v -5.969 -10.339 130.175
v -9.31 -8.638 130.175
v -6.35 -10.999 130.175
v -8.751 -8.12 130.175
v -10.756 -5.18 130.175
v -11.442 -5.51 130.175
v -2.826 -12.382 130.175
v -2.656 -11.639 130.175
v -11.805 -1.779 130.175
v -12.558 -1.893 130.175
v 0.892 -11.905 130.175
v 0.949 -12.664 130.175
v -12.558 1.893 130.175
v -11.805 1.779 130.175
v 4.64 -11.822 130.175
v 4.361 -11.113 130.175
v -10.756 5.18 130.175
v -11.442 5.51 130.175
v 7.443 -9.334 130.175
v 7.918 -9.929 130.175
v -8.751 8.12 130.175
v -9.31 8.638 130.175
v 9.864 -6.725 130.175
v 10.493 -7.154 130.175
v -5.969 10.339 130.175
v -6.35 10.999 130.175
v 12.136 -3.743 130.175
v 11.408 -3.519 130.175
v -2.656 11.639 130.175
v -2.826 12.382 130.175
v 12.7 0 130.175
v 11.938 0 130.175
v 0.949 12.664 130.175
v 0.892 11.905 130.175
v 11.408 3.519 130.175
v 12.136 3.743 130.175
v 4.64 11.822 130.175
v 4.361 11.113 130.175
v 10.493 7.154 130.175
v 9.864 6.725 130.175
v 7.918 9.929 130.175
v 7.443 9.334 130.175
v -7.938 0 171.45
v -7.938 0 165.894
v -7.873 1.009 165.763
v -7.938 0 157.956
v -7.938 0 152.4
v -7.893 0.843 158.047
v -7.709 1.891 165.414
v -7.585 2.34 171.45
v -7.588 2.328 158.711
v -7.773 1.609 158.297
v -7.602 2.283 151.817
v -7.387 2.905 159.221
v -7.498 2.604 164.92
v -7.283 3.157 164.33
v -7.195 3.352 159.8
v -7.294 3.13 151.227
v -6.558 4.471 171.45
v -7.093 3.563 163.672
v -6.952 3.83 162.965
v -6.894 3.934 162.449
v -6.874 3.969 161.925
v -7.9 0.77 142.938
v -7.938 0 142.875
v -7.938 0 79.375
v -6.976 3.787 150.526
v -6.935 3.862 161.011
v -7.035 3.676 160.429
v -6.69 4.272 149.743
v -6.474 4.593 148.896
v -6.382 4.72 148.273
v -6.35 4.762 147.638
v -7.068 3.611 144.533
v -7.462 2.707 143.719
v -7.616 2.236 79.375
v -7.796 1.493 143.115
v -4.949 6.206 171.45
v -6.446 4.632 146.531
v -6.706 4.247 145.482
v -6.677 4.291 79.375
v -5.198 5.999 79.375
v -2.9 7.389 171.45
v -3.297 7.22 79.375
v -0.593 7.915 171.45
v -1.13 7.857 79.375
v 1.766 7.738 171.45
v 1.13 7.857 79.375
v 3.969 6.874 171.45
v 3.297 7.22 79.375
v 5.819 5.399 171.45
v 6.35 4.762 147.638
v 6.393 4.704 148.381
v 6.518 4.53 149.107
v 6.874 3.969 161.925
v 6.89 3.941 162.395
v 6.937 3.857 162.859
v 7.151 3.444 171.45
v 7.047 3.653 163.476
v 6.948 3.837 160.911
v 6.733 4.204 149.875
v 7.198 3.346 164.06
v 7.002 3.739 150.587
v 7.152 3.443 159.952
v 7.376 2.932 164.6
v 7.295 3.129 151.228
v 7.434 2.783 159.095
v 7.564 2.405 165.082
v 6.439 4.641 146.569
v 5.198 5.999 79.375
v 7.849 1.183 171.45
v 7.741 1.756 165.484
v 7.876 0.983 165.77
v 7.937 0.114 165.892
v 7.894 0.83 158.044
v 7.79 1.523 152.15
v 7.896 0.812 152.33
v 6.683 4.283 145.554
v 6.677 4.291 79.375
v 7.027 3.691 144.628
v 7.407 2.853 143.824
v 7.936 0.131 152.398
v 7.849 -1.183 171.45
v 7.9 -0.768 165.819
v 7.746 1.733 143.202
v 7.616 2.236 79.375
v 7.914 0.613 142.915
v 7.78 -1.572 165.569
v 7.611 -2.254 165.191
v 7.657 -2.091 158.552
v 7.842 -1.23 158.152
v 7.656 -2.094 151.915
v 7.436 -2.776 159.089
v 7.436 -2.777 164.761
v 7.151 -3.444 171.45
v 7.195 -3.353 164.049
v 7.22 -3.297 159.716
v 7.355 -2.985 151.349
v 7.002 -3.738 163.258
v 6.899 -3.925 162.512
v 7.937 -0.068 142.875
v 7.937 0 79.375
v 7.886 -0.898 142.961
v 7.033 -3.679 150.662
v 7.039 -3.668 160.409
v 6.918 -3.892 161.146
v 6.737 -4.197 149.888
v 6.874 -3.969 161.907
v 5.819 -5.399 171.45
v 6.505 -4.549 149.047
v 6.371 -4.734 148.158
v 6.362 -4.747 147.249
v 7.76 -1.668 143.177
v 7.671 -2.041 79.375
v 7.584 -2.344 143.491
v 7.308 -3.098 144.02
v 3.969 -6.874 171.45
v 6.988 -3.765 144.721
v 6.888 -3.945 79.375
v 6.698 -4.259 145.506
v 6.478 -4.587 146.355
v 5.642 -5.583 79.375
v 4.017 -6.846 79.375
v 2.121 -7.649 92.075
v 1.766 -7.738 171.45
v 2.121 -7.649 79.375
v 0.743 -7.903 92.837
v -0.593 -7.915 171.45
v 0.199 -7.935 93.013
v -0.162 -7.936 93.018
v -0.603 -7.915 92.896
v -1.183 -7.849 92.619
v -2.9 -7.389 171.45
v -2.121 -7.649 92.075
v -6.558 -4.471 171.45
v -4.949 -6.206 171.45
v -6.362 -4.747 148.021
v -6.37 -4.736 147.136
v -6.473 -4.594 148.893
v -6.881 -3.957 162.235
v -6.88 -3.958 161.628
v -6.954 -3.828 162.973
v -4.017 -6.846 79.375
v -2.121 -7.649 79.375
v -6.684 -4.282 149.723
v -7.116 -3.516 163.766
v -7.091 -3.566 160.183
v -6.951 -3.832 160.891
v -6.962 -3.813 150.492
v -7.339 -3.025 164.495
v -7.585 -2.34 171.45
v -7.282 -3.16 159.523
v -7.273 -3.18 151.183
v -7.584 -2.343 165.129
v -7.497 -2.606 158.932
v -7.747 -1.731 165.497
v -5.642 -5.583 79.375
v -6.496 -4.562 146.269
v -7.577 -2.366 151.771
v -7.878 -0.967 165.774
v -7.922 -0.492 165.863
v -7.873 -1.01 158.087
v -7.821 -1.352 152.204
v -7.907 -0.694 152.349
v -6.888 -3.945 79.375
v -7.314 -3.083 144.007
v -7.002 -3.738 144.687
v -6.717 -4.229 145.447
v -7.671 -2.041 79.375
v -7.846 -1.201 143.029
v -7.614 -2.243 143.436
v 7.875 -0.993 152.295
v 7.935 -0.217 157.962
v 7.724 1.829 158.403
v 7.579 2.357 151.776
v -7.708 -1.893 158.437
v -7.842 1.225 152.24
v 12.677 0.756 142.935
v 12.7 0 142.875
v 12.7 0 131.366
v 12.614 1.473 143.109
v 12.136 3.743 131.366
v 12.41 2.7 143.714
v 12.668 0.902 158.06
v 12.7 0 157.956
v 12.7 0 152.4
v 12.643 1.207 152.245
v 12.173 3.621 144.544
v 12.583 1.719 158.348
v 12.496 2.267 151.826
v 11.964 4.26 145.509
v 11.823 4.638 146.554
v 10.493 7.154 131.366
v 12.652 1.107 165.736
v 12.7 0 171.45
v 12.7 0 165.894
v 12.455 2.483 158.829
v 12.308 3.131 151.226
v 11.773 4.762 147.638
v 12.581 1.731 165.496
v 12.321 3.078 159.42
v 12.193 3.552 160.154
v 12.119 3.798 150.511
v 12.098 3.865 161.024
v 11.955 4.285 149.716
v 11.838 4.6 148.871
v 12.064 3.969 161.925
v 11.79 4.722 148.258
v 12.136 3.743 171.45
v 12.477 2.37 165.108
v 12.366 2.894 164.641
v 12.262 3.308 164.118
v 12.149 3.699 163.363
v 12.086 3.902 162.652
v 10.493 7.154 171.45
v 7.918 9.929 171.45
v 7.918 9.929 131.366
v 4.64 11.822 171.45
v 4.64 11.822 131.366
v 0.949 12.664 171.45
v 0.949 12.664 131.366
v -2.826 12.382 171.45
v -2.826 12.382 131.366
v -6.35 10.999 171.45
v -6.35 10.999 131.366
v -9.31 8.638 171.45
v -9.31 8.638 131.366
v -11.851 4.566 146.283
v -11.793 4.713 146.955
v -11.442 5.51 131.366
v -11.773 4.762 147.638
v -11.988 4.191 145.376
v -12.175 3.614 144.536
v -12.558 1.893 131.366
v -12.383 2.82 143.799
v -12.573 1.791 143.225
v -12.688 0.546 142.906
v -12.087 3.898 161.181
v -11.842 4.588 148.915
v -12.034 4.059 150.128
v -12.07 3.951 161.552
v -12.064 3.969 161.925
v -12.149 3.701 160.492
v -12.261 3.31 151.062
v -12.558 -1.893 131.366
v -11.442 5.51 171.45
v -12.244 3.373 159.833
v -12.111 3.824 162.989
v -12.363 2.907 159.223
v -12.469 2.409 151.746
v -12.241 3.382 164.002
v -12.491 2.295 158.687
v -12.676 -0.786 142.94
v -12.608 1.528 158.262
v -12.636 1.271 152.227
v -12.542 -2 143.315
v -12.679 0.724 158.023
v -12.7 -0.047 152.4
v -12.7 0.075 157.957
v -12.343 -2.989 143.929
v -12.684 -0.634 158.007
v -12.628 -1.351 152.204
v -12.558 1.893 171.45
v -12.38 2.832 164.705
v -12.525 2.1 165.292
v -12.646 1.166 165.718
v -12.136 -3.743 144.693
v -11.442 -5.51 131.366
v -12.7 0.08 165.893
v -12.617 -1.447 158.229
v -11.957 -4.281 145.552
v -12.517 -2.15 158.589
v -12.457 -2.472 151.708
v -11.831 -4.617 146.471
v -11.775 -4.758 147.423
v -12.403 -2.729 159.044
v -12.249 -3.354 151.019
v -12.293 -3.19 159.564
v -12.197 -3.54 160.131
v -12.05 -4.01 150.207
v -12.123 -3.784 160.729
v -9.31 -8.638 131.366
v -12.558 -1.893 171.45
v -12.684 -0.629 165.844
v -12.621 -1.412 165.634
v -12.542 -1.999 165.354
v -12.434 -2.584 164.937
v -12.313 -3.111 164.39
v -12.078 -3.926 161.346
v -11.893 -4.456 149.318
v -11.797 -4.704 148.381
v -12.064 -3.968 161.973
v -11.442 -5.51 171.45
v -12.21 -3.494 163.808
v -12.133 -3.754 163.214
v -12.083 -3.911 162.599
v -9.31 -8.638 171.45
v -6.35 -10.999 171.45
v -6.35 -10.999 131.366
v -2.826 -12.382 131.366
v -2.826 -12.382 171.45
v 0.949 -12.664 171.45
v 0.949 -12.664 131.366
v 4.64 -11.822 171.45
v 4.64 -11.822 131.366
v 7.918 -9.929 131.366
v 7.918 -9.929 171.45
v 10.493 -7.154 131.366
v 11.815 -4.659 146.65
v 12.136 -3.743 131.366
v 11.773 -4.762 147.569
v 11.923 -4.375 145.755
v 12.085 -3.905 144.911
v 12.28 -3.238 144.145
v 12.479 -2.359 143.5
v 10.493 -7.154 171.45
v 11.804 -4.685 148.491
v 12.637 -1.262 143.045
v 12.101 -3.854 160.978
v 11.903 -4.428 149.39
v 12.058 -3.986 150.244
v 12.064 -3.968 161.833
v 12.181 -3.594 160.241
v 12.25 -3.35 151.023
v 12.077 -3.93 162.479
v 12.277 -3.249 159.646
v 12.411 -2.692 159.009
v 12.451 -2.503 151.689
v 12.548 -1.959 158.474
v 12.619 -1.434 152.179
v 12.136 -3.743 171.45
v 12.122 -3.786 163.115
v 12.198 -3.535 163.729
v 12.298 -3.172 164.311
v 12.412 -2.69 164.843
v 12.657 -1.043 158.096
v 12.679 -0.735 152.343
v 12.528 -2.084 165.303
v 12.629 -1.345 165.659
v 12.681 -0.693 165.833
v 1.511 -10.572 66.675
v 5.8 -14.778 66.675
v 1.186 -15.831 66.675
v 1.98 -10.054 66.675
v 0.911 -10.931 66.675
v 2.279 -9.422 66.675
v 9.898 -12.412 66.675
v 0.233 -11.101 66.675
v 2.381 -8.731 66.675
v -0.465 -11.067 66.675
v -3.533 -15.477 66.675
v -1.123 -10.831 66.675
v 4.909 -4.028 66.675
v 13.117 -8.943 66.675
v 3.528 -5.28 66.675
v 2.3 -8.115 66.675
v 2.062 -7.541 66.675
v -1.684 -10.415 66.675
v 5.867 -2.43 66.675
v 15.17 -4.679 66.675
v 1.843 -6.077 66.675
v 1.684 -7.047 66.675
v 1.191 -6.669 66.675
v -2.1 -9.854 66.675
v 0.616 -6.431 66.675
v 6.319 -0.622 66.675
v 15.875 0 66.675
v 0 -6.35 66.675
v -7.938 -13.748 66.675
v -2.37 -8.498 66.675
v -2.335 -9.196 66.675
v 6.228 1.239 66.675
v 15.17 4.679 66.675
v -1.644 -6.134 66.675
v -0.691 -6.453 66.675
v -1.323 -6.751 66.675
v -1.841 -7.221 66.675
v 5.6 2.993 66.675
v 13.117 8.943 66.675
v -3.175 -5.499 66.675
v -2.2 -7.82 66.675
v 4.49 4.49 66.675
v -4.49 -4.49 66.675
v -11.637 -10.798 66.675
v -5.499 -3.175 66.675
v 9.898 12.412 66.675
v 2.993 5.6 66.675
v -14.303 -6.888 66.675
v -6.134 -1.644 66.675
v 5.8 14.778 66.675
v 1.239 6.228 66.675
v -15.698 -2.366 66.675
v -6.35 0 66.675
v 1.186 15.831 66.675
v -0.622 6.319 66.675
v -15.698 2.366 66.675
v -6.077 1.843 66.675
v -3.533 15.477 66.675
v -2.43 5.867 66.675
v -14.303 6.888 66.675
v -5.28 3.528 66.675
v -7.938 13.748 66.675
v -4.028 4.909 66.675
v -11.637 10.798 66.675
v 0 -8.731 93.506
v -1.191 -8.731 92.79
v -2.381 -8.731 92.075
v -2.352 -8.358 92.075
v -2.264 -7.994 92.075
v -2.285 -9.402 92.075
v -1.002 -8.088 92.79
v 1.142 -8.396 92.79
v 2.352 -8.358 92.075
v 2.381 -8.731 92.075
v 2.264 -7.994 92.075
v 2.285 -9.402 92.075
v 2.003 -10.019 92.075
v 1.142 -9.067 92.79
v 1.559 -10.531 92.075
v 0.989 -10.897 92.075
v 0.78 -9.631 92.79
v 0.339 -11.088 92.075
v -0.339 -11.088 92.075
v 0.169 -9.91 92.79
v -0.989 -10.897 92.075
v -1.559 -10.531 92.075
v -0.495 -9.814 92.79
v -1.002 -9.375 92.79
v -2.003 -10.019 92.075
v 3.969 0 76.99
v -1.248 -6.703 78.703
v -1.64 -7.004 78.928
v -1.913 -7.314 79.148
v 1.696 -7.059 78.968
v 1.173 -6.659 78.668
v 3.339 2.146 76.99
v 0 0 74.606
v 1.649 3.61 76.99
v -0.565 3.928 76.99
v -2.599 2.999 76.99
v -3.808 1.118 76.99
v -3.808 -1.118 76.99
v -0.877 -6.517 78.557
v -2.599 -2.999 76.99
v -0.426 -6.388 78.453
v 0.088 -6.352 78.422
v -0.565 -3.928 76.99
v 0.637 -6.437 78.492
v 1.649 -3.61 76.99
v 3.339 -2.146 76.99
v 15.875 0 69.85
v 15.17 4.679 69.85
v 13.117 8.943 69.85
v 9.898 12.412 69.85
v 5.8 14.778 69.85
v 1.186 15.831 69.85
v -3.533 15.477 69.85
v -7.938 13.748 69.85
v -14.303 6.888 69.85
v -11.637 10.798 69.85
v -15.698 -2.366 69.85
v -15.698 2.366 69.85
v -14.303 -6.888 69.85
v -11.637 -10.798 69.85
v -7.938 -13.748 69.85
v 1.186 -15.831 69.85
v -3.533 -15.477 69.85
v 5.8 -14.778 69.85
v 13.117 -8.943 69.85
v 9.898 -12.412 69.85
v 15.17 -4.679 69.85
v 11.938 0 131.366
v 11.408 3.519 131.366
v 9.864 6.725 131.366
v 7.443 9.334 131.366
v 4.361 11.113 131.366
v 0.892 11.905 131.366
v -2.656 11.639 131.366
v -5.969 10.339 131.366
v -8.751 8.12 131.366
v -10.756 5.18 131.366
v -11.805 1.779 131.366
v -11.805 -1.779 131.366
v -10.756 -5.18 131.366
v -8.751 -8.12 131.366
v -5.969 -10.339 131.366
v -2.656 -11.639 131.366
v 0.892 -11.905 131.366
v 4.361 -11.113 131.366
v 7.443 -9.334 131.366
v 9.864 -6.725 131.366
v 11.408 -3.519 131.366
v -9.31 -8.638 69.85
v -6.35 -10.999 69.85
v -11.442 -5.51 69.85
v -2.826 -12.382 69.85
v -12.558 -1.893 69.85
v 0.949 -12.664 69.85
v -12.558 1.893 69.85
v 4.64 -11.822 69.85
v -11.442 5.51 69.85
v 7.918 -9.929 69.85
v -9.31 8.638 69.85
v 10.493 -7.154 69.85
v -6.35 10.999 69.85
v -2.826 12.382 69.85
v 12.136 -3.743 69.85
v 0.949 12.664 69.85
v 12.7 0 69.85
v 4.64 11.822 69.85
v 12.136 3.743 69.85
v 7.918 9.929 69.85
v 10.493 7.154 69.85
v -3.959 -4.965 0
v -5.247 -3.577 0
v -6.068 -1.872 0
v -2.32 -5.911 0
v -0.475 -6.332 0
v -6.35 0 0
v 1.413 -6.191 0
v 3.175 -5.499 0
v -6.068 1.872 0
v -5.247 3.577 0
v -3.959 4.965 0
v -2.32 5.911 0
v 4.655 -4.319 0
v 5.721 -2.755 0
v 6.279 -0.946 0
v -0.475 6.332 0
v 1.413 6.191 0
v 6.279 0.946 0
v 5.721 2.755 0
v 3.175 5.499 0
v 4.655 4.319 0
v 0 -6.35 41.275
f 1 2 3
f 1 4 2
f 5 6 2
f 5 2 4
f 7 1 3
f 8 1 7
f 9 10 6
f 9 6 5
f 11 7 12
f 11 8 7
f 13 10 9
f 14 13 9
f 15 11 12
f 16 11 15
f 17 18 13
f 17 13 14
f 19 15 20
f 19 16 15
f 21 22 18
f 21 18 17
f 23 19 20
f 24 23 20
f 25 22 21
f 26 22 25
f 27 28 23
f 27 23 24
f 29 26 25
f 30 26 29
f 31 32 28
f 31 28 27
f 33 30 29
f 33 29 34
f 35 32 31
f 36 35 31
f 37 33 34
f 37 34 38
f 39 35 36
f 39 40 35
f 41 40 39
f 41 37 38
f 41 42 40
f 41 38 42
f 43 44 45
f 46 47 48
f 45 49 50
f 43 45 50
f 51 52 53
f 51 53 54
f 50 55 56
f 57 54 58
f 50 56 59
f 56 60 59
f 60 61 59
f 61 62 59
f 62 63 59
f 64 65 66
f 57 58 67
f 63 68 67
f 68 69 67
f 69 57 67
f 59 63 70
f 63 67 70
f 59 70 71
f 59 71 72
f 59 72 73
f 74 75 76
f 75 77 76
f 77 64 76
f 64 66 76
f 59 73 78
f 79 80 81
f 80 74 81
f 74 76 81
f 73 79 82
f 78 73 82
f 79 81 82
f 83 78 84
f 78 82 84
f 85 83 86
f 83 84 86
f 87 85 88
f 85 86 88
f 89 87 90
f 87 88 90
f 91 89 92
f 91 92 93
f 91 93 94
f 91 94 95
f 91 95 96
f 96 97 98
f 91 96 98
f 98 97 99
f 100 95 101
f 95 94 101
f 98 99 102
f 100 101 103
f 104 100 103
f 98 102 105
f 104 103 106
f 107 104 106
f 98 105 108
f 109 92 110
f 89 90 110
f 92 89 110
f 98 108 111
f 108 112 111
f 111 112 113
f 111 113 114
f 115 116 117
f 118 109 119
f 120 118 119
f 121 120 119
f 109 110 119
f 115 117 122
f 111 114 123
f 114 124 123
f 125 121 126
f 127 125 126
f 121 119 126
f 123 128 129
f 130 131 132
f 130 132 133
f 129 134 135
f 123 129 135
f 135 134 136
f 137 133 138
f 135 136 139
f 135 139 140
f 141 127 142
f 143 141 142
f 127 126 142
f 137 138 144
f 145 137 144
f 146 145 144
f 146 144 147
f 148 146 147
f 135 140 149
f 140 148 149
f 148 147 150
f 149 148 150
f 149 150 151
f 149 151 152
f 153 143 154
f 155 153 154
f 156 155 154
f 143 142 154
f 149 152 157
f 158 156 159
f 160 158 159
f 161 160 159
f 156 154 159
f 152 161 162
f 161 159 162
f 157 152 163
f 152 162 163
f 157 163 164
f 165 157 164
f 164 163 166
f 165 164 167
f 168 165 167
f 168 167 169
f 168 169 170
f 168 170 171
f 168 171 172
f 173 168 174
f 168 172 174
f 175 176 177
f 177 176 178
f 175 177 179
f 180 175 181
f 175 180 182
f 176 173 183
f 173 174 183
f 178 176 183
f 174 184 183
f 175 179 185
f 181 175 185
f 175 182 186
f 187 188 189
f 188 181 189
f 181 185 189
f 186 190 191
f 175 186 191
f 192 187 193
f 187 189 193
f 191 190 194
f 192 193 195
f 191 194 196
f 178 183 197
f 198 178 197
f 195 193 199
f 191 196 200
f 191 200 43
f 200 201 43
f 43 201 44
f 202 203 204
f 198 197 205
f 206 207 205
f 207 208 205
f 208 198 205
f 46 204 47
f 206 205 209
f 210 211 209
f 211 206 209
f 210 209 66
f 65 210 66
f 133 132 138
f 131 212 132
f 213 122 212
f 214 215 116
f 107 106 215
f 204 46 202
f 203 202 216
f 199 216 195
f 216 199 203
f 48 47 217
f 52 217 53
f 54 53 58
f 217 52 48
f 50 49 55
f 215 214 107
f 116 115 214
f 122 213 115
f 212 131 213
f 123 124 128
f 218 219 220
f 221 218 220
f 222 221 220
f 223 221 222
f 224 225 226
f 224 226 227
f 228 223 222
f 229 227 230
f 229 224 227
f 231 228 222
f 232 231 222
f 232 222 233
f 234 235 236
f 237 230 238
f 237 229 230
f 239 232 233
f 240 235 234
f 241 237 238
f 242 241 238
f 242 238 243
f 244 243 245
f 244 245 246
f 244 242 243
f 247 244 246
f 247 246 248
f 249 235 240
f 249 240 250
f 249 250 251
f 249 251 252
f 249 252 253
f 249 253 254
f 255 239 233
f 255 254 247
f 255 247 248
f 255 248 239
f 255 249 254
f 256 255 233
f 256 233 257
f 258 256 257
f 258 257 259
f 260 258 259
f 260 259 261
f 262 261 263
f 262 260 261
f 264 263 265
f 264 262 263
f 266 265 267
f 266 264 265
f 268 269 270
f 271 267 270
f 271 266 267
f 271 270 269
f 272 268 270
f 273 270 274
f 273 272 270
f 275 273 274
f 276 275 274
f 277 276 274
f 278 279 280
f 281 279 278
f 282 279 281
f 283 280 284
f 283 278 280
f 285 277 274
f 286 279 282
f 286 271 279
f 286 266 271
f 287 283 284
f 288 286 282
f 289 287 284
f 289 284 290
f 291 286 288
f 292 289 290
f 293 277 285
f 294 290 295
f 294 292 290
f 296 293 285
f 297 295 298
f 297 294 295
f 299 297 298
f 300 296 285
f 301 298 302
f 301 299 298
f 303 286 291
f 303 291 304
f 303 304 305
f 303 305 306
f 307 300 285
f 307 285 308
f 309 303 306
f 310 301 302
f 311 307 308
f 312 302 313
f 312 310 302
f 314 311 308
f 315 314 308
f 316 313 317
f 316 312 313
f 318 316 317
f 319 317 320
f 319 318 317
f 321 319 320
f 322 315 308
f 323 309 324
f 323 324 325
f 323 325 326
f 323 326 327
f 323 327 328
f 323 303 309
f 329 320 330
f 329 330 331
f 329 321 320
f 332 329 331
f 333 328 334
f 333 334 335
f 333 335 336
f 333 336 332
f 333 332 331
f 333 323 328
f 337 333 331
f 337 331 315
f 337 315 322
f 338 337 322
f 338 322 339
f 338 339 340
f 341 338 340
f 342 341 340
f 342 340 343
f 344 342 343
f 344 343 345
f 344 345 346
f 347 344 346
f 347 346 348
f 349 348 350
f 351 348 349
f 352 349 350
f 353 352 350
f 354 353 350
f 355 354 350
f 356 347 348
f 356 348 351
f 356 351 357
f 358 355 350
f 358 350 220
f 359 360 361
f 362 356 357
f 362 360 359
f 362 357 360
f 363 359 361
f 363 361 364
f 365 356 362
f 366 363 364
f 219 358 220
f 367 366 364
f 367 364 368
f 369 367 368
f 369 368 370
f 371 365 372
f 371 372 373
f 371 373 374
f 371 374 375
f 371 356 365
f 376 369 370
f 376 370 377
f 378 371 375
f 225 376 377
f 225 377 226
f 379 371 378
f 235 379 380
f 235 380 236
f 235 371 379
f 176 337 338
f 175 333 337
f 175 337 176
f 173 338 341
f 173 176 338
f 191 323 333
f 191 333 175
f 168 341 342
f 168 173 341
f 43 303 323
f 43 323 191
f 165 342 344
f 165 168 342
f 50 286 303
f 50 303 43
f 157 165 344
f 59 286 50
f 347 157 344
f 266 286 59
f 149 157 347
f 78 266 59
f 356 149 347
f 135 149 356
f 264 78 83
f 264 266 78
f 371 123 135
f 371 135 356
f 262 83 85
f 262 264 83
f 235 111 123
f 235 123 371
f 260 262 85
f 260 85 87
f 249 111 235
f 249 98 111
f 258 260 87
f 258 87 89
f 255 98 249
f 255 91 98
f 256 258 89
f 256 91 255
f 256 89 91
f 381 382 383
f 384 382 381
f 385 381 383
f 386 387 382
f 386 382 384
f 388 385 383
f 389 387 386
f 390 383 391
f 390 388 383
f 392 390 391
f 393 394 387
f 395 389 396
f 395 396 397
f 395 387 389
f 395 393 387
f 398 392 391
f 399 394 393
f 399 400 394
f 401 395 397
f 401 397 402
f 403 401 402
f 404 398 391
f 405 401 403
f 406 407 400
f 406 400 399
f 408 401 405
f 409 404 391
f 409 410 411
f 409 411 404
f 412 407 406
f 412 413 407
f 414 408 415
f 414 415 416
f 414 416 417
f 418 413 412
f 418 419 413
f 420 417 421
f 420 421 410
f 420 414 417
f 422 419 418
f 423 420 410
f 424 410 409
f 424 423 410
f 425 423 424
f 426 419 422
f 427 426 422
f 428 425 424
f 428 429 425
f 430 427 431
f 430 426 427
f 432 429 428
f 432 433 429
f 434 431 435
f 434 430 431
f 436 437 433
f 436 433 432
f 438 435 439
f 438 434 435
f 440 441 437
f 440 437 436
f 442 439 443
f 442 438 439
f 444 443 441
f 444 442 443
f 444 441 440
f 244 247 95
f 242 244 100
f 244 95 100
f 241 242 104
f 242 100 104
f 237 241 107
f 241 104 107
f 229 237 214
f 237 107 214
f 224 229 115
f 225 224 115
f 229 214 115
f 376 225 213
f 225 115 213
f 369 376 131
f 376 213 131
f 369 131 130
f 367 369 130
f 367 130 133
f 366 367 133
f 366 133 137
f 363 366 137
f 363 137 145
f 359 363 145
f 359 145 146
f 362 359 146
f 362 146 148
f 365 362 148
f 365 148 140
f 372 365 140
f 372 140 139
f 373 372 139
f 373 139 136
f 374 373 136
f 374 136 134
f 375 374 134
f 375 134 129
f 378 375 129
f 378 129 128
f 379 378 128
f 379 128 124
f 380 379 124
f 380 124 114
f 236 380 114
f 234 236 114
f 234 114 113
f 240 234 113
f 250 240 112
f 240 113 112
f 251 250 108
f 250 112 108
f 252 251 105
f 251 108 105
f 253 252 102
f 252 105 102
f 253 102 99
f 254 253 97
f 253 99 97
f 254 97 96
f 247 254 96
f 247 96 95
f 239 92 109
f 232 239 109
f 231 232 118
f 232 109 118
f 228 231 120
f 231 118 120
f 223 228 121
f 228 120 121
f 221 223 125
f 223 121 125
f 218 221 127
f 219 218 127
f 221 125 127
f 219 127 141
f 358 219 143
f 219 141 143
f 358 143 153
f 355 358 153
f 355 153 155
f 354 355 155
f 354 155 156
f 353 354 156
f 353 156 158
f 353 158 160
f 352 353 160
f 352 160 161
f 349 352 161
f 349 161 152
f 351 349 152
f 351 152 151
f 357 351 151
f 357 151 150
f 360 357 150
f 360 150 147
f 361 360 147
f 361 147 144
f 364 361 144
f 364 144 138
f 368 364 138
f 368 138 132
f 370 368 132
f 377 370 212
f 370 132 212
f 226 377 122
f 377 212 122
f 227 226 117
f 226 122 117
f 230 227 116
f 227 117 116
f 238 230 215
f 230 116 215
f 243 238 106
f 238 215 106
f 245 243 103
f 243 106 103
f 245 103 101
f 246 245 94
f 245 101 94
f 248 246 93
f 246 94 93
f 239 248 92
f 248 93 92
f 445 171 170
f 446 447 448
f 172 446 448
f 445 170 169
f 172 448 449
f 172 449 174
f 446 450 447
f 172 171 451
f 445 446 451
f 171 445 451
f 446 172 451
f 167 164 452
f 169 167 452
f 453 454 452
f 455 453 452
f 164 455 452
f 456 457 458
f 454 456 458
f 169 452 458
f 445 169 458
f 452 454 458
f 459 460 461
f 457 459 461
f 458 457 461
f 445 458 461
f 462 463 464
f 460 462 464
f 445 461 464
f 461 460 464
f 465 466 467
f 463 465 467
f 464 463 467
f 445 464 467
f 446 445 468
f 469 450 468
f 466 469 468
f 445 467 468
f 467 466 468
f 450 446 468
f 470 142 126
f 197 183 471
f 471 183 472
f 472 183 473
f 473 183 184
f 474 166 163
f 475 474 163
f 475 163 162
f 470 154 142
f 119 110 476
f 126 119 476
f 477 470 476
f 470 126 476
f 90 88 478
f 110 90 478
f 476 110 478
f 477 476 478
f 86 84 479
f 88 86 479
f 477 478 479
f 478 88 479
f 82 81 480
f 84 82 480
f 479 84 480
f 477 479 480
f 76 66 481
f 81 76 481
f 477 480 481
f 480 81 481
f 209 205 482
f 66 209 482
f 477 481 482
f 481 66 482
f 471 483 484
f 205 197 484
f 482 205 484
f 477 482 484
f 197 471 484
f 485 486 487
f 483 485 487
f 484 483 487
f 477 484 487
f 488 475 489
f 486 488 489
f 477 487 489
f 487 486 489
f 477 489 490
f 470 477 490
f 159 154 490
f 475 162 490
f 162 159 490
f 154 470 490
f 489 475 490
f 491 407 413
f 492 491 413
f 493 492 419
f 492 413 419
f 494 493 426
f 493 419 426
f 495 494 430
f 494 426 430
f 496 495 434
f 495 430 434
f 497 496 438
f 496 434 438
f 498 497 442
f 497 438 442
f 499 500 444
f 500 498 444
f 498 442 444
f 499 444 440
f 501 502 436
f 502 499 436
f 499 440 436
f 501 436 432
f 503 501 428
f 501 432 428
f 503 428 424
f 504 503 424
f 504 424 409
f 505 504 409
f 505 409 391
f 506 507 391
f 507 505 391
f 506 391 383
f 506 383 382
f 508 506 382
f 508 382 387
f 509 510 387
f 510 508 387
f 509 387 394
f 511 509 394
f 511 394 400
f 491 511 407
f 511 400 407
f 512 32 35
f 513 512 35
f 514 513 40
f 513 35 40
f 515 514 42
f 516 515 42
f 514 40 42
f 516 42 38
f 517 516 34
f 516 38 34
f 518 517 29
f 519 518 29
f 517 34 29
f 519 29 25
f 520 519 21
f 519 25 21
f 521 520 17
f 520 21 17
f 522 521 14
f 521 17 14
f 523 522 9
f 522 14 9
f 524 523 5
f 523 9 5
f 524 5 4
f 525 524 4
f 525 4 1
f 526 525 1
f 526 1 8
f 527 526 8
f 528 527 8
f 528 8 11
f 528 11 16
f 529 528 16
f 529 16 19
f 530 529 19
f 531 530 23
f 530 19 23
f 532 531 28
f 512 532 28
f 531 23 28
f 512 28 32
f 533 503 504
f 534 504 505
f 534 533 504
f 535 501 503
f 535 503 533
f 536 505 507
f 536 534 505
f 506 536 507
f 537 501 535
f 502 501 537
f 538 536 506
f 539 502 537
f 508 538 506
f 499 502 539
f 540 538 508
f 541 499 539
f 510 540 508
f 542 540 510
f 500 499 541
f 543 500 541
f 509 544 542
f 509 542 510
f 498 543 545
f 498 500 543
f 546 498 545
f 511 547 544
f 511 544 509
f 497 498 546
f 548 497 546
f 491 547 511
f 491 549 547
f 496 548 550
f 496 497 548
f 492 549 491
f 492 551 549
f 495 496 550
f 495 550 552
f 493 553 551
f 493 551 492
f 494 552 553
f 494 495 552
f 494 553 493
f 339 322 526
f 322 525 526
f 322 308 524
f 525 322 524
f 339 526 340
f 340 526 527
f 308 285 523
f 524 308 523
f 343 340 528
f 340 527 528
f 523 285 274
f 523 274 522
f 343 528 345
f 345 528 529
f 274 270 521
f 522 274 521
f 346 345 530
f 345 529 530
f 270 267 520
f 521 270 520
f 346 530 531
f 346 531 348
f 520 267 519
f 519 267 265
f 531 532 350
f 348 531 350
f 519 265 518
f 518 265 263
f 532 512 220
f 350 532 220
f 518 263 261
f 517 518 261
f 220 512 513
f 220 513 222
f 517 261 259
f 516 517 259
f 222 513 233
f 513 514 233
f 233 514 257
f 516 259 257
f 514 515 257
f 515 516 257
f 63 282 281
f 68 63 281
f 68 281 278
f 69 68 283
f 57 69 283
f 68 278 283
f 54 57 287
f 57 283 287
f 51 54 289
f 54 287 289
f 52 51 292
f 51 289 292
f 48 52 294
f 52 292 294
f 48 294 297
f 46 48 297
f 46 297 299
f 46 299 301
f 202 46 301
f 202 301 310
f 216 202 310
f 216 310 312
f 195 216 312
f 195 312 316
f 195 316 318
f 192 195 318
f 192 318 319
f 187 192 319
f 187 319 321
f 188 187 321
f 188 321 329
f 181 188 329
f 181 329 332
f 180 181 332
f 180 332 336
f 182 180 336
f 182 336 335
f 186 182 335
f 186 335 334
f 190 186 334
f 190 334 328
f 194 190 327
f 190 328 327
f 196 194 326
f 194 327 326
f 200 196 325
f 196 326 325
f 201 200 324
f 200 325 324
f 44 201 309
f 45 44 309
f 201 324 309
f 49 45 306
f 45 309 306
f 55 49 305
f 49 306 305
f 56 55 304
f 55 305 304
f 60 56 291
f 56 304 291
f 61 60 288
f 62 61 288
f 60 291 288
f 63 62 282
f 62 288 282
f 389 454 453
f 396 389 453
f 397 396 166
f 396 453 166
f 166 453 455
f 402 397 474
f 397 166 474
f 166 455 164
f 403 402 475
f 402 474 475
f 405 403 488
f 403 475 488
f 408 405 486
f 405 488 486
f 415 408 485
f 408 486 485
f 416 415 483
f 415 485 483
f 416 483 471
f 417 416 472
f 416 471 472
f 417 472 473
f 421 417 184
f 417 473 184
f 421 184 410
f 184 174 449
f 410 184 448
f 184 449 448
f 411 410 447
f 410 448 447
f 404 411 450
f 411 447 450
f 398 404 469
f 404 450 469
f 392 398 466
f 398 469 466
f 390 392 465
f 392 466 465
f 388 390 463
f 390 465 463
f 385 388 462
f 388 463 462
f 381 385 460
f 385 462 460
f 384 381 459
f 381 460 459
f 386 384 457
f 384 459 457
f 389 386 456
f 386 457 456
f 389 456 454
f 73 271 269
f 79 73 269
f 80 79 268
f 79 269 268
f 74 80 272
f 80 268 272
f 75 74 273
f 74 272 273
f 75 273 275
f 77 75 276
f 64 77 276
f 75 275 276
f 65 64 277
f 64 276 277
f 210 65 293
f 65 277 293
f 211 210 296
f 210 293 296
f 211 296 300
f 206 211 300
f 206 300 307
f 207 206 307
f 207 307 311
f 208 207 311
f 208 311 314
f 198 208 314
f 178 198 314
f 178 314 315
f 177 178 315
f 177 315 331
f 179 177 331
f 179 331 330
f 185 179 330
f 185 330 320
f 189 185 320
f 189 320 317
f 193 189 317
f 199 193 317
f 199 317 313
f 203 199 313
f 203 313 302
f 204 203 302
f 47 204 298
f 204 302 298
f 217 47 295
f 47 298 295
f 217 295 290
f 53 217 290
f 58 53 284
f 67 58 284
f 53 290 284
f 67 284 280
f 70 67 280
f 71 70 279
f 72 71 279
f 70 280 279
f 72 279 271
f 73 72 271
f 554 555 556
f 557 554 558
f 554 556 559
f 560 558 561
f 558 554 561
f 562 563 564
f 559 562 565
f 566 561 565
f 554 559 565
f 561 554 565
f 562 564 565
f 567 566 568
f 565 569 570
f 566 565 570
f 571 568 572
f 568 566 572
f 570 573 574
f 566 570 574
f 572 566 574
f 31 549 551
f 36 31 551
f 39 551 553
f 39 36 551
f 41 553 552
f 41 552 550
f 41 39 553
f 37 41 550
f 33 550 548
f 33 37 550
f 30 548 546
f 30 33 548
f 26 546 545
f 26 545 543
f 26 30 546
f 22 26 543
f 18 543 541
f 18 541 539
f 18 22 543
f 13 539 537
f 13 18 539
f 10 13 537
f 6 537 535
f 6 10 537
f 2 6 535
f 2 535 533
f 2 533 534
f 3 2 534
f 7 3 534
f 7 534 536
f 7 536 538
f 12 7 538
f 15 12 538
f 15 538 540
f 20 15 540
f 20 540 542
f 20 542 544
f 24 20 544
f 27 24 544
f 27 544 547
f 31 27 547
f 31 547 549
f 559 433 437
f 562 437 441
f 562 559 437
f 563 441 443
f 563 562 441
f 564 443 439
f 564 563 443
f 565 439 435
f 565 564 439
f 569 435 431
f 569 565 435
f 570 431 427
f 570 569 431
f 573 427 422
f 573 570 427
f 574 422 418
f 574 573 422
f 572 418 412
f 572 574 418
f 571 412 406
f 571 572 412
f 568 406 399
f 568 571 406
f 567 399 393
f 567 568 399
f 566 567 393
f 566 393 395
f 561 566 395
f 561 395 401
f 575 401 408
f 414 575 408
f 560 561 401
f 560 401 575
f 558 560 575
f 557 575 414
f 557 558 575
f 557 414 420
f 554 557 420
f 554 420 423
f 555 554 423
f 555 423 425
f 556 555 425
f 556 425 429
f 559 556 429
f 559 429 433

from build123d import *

# Parameters (mm, degrees)
SKETCH1_R          = 15.875
RAWSTOCK_DEPTH     = 194.6402
SKETCH10_R         = 12.7
FACINGOP_DEPTH     = 23.1902
RELIEFHOLE_D       = 12.7
RELIEFHOLE_DEPTH   = 92.075
RELIEFHOLE_TIP     = 3.815464931
WIRESHOLE_D        = 15.875
WIRESHOLE_DEPTH    = 115.2652
WIRESHOLE_TIP      = 4.769331164
SKETCH6_OUTSIDE_W  = 73.7
SKETCH6_OUTSIDE_H  = 73.7
SKETCH6_OUTSIDE_R  = 12.7
SHAFTDIAM_DEPTH    = 124.7902
SKETCH7_OUTSIDE_W  = 69.196
SKETCH7_OUTSIDE_H  = 69.196
SKETCH7_OUTSIDE_R  = 11.938
GROOVE_DEPTH       = 1.190625
SKETCH8_OUTSIDE_W  = 69.196
SKETCH8_OUTSIDE_H  = 69.196
SKETCH8_OUTSIDE_R  = 6.35
ENCODERSHAFT_DEPTH = 66.675
SKETCH12_R         = 3.96875
SKETCH12_R_2       = 4.7625
HOLES_TOP_DEPTH    = 29.575
SLIPRINGHOLE_D     = 4.7625
SLIPRINGHOLE_DEPTH = 25.4
SLIPRINGHOLE_TIP   = 1.430799349


with BuildPart() as part:
    # Sketch1 → RawStock (new body)
    with BuildSketch(Plane.XY):
        Circle(SKETCH1_R)
    extrude(amount=RAWSTOCK_DEPTH)

    # Sketch10 → FacingOp (cut)
    with BuildSketch(Plane.XY.offset(194.6402)):
        Circle(SKETCH10_R)
    extrude(amount=-FACINGOP_DEPTH, mode=Mode.SUBTRACT)

    # ReliefHole
    with Locations(Plane.XY.offset(194.6402)):
        with Locations((0, 0)):
            Hole(RELIEFHOLE_D / 2, depth=RELIEFHOLE_DEPTH)
            with Locations((0, 0, -(RELIEFHOLE_DEPTH + RELIEFHOLE_TIP / 2))):  # 118° drill point
                Cone(0, RELIEFHOLE_D / 2, RELIEFHOLE_TIP, mode=Mode.SUBTRACT)

    # WiresHole
    with Locations(Plane.XY.offset(194.6402)):
        with Locations((0, 0)):
            Hole(WIRESHOLE_D / 2, depth=WIRESHOLE_DEPTH)
            with Locations((0, 0, -(WIRESHOLE_DEPTH + WIRESHOLE_TIP / 2))):  # 118° drill point
                Cone(0, WIRESHOLE_D / 2, WIRESHOLE_TIP, mode=Mode.SUBTRACT)

    # Sketch6 outside → ShaftDiam (cut)
    with BuildSketch(Plane.XY.offset(194.6402)):
        Rectangle(SKETCH6_OUTSIDE_W, SKETCH6_OUTSIDE_H)
        Circle(SKETCH6_OUTSIDE_R, mode=Mode.SUBTRACT)
    extrude(amount=-SHAFTDIAM_DEPTH, mode=Mode.SUBTRACT)

    # Sketch7 outside → Groove (cut)
    with BuildSketch(Plane.XY.offset(130.175)):
        Rectangle(SKETCH7_OUTSIDE_W, SKETCH7_OUTSIDE_H)
        Circle(SKETCH7_OUTSIDE_R, mode=Mode.SUBTRACT)
    extrude(amount=GROOVE_DEPTH, mode=Mode.SUBTRACT)

    # Sketch8 outside → EncoderShaft (cut)
    with BuildSketch(Plane(origin=(0, 0, 0), x_dir=(-1, 0, 0), z_dir=(0, 0, -1))):
        Rectangle(SKETCH8_OUTSIDE_W, SKETCH8_OUTSIDE_H)
        Circle(SKETCH8_OUTSIDE_R, mode=Mode.SUBTRACT)
    extrude(amount=-ENCODERSHAFT_DEPTH, mode=Mode.SUBTRACT)

    # Sketch12 → Holes_Top (cut, through all)
    with BuildSketch(Plane(origin=(-12.7, 0, 0), x_dir=(0, 1, 0), z_dir=(-1, 0, 0))):
        with Locations((0, -161.925)):
            Circle(SKETCH12_R)
        with Locations((0, -147.6375)):
            Circle(SKETCH12_R_2)
    extrude(amount=-HOLES_TOP_DEPTH, mode=Mode.SUBTRACT)

    # SlipRingHole
    with Locations(Plane(origin=(0, 0, 66.675), x_dir=(-1, 0, 0), z_dir=(0, 0, -1))):
        with Locations((0, -8.73125)):
            Hole(SLIPRINGHOLE_D / 2, depth=SLIPRINGHOLE_DEPTH)
            with Locations((0, 0, -(SLIPRINGHOLE_DEPTH + SLIPRINGHOLE_TIP / 2))):  # 118° drill point
                Cone(0, SLIPRINGHOLE_D / 2, SLIPRINGHOLE_TIP, mode=Mode.SUBTRACT)


solid = part.part
